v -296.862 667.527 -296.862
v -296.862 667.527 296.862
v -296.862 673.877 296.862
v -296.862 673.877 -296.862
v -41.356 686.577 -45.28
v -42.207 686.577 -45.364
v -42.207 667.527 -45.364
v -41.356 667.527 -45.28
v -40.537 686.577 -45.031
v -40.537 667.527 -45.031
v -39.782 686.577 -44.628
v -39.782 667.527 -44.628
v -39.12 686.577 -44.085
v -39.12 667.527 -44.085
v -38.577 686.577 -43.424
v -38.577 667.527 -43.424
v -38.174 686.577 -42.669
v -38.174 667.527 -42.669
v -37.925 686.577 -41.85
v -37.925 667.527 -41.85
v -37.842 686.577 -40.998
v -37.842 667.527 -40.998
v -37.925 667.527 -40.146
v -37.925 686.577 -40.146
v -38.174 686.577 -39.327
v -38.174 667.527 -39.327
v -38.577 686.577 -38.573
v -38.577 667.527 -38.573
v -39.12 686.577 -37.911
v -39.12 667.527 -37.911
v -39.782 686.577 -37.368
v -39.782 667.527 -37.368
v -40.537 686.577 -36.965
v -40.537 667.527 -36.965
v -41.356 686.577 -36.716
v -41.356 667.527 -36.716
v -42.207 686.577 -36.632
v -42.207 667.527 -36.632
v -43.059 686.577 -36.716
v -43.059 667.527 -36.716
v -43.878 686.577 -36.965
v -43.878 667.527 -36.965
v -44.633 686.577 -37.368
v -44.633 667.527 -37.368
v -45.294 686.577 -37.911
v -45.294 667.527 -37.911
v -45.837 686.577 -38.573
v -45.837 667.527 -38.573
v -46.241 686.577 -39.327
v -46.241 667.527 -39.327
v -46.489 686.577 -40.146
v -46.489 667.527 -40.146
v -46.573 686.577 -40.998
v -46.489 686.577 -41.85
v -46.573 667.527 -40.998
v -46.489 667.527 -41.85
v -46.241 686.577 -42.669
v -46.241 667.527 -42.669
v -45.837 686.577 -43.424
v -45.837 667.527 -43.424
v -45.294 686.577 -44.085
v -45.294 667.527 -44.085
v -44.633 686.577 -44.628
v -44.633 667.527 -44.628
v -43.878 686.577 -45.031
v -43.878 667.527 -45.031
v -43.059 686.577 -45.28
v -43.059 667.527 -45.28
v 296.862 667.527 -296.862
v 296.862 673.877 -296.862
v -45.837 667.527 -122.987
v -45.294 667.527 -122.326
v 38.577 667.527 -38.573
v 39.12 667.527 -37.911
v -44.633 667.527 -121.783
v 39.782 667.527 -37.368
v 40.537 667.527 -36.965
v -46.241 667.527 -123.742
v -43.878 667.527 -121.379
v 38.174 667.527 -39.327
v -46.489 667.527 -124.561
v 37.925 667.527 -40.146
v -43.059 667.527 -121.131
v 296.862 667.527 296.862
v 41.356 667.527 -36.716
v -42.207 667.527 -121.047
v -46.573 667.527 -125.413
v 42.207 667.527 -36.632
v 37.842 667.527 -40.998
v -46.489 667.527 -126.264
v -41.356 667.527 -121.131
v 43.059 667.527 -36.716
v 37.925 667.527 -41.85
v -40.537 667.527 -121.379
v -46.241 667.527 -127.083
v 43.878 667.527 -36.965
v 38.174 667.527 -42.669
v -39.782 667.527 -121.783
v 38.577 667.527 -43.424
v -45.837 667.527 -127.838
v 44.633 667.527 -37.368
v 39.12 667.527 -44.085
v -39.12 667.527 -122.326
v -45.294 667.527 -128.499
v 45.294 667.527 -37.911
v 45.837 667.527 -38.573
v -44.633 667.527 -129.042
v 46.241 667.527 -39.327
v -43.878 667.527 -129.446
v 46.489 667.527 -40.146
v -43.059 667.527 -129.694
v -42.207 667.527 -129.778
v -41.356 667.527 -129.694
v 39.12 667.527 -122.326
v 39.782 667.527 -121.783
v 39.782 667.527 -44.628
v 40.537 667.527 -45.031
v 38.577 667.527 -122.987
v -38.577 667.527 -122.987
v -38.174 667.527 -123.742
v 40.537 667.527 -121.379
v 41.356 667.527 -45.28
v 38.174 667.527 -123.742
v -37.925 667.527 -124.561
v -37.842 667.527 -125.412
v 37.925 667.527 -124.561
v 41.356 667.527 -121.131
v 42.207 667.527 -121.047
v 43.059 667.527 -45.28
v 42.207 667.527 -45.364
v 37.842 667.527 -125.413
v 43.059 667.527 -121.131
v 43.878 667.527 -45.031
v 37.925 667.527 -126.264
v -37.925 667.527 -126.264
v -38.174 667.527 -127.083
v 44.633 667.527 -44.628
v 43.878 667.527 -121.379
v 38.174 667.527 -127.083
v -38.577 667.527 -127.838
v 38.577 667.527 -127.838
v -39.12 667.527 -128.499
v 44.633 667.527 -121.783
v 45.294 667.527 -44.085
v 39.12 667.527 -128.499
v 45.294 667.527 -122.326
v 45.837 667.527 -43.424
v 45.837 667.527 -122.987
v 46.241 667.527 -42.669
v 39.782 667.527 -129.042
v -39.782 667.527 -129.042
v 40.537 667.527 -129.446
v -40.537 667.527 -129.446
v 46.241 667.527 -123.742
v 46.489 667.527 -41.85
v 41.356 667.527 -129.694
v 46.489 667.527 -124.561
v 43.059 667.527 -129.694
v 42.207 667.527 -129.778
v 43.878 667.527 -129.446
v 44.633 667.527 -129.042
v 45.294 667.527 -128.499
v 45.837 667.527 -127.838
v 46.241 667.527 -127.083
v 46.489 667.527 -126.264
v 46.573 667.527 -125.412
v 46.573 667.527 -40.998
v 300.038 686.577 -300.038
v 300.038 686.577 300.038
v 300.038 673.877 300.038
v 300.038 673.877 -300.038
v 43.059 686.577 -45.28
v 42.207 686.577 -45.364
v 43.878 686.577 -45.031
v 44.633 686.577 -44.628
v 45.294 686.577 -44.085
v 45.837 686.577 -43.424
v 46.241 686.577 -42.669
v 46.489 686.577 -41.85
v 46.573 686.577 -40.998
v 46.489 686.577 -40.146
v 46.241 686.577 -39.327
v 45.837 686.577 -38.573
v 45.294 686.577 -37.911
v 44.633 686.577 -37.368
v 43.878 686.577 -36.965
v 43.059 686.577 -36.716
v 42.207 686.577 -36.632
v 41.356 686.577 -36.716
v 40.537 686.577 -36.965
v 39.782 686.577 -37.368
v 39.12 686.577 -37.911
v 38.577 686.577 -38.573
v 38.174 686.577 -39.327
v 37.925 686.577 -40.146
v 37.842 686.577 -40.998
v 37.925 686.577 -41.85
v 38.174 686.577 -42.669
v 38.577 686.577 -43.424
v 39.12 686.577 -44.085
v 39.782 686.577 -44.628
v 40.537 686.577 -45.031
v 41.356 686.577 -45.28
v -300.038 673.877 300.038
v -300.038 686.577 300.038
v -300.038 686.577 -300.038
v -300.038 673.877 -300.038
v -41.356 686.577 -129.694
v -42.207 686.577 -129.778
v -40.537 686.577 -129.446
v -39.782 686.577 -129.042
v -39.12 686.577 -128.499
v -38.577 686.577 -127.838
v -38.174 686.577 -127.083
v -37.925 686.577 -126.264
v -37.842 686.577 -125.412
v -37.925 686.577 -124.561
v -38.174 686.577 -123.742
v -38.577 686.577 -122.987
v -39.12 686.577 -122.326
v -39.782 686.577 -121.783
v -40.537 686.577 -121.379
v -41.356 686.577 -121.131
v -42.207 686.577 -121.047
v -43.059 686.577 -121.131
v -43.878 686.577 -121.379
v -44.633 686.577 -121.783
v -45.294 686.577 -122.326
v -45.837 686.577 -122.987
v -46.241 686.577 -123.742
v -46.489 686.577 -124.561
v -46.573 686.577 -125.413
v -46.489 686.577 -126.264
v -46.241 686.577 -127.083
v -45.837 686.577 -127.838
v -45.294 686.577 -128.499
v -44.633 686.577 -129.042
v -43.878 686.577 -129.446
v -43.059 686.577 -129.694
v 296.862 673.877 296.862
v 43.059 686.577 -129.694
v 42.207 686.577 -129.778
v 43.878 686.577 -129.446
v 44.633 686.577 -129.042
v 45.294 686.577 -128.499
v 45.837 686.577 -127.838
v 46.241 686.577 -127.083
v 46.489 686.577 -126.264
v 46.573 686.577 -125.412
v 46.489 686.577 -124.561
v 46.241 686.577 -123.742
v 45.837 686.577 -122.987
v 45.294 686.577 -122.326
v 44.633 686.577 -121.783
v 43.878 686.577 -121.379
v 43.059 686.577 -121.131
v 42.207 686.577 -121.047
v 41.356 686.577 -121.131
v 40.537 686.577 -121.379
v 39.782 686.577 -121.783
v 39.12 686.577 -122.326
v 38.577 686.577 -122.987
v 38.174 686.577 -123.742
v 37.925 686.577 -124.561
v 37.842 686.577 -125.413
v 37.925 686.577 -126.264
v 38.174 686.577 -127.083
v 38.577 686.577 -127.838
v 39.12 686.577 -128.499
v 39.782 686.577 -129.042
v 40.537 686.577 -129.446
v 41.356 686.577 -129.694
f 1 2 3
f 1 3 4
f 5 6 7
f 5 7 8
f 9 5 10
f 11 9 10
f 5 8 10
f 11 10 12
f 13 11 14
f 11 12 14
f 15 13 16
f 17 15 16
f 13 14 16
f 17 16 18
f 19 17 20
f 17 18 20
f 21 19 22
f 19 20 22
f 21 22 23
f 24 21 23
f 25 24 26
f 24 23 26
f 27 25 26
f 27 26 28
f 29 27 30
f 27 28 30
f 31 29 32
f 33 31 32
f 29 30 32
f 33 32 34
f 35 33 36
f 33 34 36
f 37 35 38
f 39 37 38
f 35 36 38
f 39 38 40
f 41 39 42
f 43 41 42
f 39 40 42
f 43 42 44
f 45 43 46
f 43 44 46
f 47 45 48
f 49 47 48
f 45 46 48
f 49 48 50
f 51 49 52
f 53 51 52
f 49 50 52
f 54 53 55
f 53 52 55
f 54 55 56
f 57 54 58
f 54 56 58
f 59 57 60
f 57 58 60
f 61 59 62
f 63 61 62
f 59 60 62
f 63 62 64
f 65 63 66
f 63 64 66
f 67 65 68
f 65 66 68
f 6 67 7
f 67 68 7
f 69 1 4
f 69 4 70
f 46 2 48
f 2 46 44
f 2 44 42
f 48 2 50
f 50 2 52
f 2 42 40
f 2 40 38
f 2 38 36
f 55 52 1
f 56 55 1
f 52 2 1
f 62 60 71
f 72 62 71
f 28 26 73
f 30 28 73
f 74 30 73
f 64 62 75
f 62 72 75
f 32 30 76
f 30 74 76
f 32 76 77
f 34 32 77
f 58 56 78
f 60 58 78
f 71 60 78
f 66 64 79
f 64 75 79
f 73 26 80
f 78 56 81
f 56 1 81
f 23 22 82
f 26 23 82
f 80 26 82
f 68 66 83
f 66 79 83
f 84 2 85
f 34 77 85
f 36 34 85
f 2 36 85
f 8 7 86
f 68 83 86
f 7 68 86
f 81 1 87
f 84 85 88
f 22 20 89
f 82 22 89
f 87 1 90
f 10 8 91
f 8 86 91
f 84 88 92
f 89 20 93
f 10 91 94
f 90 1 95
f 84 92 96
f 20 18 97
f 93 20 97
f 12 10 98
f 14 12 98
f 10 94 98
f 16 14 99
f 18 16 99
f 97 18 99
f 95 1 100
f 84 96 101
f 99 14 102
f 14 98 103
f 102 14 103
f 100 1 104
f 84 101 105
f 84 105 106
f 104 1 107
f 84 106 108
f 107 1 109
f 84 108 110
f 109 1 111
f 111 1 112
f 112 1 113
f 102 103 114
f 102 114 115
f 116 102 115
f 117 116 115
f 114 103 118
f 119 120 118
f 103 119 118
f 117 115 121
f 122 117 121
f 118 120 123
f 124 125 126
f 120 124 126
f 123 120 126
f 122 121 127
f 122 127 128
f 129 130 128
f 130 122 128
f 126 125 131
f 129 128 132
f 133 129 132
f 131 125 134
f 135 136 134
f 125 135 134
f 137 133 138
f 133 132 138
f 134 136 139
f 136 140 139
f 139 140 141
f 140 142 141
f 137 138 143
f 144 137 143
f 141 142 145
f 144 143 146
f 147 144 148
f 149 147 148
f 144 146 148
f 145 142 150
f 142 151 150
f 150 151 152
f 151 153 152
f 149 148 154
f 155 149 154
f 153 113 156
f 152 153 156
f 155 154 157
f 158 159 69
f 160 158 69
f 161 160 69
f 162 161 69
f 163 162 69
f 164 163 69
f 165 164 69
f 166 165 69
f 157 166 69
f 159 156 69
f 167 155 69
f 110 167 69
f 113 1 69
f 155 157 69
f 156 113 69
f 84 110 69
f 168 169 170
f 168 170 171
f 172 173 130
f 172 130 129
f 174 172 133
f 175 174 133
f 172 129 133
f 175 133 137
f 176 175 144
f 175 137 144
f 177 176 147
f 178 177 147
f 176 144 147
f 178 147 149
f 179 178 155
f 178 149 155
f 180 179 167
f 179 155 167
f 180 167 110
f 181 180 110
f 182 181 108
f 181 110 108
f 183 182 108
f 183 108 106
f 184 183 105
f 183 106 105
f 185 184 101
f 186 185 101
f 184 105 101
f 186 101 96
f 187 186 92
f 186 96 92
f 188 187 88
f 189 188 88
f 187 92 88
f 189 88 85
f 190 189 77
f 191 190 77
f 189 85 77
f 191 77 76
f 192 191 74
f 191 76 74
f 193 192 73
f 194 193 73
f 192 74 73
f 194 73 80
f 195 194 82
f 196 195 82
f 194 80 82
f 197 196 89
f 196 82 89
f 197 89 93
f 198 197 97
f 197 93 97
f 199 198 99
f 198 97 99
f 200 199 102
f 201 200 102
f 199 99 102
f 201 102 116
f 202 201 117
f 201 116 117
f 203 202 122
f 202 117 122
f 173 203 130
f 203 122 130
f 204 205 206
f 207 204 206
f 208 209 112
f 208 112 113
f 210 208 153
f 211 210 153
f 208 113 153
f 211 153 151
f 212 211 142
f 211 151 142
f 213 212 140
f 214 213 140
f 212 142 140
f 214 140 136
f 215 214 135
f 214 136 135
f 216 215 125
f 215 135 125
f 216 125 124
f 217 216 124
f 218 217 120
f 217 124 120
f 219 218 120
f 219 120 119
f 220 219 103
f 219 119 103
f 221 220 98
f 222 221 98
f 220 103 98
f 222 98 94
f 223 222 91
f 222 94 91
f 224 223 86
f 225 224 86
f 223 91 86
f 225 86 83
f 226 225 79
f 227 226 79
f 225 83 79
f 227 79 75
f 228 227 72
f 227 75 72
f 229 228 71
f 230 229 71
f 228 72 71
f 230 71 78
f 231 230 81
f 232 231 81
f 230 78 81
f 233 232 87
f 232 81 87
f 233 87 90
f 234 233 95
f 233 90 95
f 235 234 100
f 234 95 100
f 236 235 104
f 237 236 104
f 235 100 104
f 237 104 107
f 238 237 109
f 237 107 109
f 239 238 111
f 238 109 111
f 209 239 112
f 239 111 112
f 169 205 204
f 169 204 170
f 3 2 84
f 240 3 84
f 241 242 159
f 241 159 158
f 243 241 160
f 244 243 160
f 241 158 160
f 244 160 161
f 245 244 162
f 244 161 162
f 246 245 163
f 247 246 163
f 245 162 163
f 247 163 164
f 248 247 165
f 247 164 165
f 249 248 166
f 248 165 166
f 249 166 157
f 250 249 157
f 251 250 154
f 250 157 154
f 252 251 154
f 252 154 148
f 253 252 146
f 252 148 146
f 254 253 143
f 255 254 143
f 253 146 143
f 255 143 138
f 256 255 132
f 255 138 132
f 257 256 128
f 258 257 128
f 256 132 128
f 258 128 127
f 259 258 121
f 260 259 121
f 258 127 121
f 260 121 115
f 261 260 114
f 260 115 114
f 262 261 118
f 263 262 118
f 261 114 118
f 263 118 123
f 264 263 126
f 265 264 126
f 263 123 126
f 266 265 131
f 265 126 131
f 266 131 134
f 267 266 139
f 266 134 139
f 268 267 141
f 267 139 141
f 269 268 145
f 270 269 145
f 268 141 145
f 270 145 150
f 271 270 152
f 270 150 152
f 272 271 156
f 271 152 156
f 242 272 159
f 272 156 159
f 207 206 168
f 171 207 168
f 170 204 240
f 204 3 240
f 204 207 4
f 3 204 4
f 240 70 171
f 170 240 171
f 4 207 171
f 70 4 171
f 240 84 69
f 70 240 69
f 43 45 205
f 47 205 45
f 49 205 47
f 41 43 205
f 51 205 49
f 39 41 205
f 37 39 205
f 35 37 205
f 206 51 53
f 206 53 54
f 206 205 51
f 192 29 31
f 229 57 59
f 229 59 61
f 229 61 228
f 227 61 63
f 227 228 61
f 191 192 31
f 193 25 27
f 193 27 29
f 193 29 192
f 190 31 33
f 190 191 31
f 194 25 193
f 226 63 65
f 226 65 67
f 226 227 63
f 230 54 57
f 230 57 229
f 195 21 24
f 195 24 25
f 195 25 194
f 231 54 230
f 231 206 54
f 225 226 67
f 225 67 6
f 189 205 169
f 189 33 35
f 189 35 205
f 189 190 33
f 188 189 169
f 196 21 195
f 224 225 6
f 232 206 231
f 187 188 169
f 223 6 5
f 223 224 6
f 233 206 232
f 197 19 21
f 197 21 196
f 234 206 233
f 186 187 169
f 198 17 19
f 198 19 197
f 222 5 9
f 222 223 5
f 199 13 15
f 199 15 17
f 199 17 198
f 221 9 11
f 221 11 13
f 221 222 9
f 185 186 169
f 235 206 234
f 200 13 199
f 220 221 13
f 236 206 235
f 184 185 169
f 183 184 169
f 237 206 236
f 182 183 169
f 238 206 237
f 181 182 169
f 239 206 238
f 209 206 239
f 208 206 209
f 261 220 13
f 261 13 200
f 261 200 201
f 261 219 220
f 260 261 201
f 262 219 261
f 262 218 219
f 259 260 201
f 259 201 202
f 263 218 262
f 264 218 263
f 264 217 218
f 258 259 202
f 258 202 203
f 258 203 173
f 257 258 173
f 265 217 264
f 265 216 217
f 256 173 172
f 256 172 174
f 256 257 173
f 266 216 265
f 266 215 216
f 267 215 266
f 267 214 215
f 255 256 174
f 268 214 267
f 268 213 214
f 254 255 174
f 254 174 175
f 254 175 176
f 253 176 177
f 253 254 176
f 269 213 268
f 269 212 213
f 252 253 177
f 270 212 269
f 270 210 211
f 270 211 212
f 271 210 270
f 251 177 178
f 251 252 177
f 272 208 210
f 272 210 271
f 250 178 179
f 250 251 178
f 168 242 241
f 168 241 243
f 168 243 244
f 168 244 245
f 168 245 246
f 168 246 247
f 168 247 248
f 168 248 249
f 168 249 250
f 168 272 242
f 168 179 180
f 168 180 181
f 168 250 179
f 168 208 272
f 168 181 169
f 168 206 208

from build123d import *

# Parameters (mm, degrees)
SKETCH1_W           = 593.725
SKETCH1_H           = 593.725
BOSS_EXTRUDE1_DEPTH = 19.05
SKETCH3_W           = 600.075
SKETCH3_H           = 600.075
BOSS_EXTRUDE2_DEPTH = 12.7
SKETCH4_R           = 4.365625
CUT_EXTRUDE1_DEPTH  = 19.05


with BuildPart() as part:
    # Sketch1 → Boss-Extrude1 (new body)
    with BuildSketch(Plane(origin=(-151.113711937, 667.527127164, 96.73817395), x_dir=(1, 0, 0), z_dir=(0, 1, 0))):
        with Locations((151.113711937, 96.73817395)):
            Rectangle(SKETCH1_W, SKETCH1_H)
    extrude(amount=BOSS_EXTRUDE1_DEPTH)

    # Sketch3 → Boss-Extrude2 (add)
    with BuildSketch(Plane(origin=(0, 686.577127164, 0), x_dir=(1, 0, 0), z_dir=(0, 1, 0))):
        Rectangle(SKETCH3_W, SKETCH3_H)
    extrude(amount=-BOSS_EXTRUDE2_DEPTH)

    # Sketch4 → Cut-Extrude1 (cut)
    with BuildSketch(Plane.XZ.offset(-667.527127164)):
        with Locations(Location((42.207203769, -40.998092462, 0), (0, 0, 270))):
            Circle(SKETCH4_R)
        with Locations(Location((-42.207203769, -40.998092462, 0), (0, 0, 270))):
            Circle(SKETCH4_R)
        with Locations(Location((-42.207203769, -125.4125, 0), (0, 0, 270))):
            Circle(SKETCH4_R)
        with Locations(Location((42.207203769, -125.4125, 0), (0, 0, 270))):
            Circle(SKETCH4_R)
    extrude(amount=-CUT_EXTRUDE1_DEPTH, mode=Mode.SUBTRACT)


solid = part.part
